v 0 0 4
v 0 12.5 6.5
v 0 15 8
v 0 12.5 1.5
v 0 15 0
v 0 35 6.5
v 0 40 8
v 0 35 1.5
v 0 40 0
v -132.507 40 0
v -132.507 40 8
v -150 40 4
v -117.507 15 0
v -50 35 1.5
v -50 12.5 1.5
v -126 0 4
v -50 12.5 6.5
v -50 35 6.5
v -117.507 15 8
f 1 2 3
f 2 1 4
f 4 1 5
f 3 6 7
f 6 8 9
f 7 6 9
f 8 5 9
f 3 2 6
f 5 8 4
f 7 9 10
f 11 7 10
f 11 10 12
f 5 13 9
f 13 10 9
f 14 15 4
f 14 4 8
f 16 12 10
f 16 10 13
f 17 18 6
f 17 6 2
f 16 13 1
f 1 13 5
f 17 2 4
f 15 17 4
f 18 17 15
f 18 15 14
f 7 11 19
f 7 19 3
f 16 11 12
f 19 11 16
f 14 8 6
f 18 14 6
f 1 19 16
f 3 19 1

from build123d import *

# Parameters (mm, degrees)
F1_DEPTH = 8
F2_SIZE2 = 14.99999
F2_SIZE  = 3.99999
F3_SIZE2 = 4
F3_SIZE  = 15
F5_DEPTH = 50


# Not quite as in the source:
# - a fillet or chamfer is up to 0.001 mm smaller than in the source, because OpenCascade refuses the exact size


with BuildPart() as f1:
    # F0 (on Top) → F1 (new body)
    with BuildSketch(Plane.XY):
        Polygon((-126, 0), (0, 0), (0, 40), (-150, 40), align=None)
    extrude(amount=F1_DEPTH)

    # F2 (size 4 and 15 in the source; OpenCascade refuses exactly that, so slightly less here)
    f2_edges = [f1.edges().sort_by_distance(p)[0] for p in [
        (-63, 0, 8),
        (-138, 20, 8),
        (-63, 0, 0),
    ]]
    chamfer(f2_edges, length=F2_SIZE, length2=F2_SIZE2)

    # F3
    f3_edges = [f1.edges().sort_by_distance(p)[0] for p in [
        (-142.499997, 27.499995, 0),
    ]]
    f3_side = f1.faces().sort_by_distance((-71.315788, 27.719293, 0))[0]
    chamfer(f3_edges, length=F3_SIZE, length2=F3_SIZE2, reference=f3_side)

    # F4 (on face) → F5 (cut)
    with BuildSketch(Plane.YZ):
        Polygon((12.5, 6.5), (12.5, 4), (12.5, 1.5), (35, 1.5), (35, 6.5), align=None)
    extrude(amount=-F5_DEPTH, mode=Mode.SUBTRACT)


solid = f1.part
